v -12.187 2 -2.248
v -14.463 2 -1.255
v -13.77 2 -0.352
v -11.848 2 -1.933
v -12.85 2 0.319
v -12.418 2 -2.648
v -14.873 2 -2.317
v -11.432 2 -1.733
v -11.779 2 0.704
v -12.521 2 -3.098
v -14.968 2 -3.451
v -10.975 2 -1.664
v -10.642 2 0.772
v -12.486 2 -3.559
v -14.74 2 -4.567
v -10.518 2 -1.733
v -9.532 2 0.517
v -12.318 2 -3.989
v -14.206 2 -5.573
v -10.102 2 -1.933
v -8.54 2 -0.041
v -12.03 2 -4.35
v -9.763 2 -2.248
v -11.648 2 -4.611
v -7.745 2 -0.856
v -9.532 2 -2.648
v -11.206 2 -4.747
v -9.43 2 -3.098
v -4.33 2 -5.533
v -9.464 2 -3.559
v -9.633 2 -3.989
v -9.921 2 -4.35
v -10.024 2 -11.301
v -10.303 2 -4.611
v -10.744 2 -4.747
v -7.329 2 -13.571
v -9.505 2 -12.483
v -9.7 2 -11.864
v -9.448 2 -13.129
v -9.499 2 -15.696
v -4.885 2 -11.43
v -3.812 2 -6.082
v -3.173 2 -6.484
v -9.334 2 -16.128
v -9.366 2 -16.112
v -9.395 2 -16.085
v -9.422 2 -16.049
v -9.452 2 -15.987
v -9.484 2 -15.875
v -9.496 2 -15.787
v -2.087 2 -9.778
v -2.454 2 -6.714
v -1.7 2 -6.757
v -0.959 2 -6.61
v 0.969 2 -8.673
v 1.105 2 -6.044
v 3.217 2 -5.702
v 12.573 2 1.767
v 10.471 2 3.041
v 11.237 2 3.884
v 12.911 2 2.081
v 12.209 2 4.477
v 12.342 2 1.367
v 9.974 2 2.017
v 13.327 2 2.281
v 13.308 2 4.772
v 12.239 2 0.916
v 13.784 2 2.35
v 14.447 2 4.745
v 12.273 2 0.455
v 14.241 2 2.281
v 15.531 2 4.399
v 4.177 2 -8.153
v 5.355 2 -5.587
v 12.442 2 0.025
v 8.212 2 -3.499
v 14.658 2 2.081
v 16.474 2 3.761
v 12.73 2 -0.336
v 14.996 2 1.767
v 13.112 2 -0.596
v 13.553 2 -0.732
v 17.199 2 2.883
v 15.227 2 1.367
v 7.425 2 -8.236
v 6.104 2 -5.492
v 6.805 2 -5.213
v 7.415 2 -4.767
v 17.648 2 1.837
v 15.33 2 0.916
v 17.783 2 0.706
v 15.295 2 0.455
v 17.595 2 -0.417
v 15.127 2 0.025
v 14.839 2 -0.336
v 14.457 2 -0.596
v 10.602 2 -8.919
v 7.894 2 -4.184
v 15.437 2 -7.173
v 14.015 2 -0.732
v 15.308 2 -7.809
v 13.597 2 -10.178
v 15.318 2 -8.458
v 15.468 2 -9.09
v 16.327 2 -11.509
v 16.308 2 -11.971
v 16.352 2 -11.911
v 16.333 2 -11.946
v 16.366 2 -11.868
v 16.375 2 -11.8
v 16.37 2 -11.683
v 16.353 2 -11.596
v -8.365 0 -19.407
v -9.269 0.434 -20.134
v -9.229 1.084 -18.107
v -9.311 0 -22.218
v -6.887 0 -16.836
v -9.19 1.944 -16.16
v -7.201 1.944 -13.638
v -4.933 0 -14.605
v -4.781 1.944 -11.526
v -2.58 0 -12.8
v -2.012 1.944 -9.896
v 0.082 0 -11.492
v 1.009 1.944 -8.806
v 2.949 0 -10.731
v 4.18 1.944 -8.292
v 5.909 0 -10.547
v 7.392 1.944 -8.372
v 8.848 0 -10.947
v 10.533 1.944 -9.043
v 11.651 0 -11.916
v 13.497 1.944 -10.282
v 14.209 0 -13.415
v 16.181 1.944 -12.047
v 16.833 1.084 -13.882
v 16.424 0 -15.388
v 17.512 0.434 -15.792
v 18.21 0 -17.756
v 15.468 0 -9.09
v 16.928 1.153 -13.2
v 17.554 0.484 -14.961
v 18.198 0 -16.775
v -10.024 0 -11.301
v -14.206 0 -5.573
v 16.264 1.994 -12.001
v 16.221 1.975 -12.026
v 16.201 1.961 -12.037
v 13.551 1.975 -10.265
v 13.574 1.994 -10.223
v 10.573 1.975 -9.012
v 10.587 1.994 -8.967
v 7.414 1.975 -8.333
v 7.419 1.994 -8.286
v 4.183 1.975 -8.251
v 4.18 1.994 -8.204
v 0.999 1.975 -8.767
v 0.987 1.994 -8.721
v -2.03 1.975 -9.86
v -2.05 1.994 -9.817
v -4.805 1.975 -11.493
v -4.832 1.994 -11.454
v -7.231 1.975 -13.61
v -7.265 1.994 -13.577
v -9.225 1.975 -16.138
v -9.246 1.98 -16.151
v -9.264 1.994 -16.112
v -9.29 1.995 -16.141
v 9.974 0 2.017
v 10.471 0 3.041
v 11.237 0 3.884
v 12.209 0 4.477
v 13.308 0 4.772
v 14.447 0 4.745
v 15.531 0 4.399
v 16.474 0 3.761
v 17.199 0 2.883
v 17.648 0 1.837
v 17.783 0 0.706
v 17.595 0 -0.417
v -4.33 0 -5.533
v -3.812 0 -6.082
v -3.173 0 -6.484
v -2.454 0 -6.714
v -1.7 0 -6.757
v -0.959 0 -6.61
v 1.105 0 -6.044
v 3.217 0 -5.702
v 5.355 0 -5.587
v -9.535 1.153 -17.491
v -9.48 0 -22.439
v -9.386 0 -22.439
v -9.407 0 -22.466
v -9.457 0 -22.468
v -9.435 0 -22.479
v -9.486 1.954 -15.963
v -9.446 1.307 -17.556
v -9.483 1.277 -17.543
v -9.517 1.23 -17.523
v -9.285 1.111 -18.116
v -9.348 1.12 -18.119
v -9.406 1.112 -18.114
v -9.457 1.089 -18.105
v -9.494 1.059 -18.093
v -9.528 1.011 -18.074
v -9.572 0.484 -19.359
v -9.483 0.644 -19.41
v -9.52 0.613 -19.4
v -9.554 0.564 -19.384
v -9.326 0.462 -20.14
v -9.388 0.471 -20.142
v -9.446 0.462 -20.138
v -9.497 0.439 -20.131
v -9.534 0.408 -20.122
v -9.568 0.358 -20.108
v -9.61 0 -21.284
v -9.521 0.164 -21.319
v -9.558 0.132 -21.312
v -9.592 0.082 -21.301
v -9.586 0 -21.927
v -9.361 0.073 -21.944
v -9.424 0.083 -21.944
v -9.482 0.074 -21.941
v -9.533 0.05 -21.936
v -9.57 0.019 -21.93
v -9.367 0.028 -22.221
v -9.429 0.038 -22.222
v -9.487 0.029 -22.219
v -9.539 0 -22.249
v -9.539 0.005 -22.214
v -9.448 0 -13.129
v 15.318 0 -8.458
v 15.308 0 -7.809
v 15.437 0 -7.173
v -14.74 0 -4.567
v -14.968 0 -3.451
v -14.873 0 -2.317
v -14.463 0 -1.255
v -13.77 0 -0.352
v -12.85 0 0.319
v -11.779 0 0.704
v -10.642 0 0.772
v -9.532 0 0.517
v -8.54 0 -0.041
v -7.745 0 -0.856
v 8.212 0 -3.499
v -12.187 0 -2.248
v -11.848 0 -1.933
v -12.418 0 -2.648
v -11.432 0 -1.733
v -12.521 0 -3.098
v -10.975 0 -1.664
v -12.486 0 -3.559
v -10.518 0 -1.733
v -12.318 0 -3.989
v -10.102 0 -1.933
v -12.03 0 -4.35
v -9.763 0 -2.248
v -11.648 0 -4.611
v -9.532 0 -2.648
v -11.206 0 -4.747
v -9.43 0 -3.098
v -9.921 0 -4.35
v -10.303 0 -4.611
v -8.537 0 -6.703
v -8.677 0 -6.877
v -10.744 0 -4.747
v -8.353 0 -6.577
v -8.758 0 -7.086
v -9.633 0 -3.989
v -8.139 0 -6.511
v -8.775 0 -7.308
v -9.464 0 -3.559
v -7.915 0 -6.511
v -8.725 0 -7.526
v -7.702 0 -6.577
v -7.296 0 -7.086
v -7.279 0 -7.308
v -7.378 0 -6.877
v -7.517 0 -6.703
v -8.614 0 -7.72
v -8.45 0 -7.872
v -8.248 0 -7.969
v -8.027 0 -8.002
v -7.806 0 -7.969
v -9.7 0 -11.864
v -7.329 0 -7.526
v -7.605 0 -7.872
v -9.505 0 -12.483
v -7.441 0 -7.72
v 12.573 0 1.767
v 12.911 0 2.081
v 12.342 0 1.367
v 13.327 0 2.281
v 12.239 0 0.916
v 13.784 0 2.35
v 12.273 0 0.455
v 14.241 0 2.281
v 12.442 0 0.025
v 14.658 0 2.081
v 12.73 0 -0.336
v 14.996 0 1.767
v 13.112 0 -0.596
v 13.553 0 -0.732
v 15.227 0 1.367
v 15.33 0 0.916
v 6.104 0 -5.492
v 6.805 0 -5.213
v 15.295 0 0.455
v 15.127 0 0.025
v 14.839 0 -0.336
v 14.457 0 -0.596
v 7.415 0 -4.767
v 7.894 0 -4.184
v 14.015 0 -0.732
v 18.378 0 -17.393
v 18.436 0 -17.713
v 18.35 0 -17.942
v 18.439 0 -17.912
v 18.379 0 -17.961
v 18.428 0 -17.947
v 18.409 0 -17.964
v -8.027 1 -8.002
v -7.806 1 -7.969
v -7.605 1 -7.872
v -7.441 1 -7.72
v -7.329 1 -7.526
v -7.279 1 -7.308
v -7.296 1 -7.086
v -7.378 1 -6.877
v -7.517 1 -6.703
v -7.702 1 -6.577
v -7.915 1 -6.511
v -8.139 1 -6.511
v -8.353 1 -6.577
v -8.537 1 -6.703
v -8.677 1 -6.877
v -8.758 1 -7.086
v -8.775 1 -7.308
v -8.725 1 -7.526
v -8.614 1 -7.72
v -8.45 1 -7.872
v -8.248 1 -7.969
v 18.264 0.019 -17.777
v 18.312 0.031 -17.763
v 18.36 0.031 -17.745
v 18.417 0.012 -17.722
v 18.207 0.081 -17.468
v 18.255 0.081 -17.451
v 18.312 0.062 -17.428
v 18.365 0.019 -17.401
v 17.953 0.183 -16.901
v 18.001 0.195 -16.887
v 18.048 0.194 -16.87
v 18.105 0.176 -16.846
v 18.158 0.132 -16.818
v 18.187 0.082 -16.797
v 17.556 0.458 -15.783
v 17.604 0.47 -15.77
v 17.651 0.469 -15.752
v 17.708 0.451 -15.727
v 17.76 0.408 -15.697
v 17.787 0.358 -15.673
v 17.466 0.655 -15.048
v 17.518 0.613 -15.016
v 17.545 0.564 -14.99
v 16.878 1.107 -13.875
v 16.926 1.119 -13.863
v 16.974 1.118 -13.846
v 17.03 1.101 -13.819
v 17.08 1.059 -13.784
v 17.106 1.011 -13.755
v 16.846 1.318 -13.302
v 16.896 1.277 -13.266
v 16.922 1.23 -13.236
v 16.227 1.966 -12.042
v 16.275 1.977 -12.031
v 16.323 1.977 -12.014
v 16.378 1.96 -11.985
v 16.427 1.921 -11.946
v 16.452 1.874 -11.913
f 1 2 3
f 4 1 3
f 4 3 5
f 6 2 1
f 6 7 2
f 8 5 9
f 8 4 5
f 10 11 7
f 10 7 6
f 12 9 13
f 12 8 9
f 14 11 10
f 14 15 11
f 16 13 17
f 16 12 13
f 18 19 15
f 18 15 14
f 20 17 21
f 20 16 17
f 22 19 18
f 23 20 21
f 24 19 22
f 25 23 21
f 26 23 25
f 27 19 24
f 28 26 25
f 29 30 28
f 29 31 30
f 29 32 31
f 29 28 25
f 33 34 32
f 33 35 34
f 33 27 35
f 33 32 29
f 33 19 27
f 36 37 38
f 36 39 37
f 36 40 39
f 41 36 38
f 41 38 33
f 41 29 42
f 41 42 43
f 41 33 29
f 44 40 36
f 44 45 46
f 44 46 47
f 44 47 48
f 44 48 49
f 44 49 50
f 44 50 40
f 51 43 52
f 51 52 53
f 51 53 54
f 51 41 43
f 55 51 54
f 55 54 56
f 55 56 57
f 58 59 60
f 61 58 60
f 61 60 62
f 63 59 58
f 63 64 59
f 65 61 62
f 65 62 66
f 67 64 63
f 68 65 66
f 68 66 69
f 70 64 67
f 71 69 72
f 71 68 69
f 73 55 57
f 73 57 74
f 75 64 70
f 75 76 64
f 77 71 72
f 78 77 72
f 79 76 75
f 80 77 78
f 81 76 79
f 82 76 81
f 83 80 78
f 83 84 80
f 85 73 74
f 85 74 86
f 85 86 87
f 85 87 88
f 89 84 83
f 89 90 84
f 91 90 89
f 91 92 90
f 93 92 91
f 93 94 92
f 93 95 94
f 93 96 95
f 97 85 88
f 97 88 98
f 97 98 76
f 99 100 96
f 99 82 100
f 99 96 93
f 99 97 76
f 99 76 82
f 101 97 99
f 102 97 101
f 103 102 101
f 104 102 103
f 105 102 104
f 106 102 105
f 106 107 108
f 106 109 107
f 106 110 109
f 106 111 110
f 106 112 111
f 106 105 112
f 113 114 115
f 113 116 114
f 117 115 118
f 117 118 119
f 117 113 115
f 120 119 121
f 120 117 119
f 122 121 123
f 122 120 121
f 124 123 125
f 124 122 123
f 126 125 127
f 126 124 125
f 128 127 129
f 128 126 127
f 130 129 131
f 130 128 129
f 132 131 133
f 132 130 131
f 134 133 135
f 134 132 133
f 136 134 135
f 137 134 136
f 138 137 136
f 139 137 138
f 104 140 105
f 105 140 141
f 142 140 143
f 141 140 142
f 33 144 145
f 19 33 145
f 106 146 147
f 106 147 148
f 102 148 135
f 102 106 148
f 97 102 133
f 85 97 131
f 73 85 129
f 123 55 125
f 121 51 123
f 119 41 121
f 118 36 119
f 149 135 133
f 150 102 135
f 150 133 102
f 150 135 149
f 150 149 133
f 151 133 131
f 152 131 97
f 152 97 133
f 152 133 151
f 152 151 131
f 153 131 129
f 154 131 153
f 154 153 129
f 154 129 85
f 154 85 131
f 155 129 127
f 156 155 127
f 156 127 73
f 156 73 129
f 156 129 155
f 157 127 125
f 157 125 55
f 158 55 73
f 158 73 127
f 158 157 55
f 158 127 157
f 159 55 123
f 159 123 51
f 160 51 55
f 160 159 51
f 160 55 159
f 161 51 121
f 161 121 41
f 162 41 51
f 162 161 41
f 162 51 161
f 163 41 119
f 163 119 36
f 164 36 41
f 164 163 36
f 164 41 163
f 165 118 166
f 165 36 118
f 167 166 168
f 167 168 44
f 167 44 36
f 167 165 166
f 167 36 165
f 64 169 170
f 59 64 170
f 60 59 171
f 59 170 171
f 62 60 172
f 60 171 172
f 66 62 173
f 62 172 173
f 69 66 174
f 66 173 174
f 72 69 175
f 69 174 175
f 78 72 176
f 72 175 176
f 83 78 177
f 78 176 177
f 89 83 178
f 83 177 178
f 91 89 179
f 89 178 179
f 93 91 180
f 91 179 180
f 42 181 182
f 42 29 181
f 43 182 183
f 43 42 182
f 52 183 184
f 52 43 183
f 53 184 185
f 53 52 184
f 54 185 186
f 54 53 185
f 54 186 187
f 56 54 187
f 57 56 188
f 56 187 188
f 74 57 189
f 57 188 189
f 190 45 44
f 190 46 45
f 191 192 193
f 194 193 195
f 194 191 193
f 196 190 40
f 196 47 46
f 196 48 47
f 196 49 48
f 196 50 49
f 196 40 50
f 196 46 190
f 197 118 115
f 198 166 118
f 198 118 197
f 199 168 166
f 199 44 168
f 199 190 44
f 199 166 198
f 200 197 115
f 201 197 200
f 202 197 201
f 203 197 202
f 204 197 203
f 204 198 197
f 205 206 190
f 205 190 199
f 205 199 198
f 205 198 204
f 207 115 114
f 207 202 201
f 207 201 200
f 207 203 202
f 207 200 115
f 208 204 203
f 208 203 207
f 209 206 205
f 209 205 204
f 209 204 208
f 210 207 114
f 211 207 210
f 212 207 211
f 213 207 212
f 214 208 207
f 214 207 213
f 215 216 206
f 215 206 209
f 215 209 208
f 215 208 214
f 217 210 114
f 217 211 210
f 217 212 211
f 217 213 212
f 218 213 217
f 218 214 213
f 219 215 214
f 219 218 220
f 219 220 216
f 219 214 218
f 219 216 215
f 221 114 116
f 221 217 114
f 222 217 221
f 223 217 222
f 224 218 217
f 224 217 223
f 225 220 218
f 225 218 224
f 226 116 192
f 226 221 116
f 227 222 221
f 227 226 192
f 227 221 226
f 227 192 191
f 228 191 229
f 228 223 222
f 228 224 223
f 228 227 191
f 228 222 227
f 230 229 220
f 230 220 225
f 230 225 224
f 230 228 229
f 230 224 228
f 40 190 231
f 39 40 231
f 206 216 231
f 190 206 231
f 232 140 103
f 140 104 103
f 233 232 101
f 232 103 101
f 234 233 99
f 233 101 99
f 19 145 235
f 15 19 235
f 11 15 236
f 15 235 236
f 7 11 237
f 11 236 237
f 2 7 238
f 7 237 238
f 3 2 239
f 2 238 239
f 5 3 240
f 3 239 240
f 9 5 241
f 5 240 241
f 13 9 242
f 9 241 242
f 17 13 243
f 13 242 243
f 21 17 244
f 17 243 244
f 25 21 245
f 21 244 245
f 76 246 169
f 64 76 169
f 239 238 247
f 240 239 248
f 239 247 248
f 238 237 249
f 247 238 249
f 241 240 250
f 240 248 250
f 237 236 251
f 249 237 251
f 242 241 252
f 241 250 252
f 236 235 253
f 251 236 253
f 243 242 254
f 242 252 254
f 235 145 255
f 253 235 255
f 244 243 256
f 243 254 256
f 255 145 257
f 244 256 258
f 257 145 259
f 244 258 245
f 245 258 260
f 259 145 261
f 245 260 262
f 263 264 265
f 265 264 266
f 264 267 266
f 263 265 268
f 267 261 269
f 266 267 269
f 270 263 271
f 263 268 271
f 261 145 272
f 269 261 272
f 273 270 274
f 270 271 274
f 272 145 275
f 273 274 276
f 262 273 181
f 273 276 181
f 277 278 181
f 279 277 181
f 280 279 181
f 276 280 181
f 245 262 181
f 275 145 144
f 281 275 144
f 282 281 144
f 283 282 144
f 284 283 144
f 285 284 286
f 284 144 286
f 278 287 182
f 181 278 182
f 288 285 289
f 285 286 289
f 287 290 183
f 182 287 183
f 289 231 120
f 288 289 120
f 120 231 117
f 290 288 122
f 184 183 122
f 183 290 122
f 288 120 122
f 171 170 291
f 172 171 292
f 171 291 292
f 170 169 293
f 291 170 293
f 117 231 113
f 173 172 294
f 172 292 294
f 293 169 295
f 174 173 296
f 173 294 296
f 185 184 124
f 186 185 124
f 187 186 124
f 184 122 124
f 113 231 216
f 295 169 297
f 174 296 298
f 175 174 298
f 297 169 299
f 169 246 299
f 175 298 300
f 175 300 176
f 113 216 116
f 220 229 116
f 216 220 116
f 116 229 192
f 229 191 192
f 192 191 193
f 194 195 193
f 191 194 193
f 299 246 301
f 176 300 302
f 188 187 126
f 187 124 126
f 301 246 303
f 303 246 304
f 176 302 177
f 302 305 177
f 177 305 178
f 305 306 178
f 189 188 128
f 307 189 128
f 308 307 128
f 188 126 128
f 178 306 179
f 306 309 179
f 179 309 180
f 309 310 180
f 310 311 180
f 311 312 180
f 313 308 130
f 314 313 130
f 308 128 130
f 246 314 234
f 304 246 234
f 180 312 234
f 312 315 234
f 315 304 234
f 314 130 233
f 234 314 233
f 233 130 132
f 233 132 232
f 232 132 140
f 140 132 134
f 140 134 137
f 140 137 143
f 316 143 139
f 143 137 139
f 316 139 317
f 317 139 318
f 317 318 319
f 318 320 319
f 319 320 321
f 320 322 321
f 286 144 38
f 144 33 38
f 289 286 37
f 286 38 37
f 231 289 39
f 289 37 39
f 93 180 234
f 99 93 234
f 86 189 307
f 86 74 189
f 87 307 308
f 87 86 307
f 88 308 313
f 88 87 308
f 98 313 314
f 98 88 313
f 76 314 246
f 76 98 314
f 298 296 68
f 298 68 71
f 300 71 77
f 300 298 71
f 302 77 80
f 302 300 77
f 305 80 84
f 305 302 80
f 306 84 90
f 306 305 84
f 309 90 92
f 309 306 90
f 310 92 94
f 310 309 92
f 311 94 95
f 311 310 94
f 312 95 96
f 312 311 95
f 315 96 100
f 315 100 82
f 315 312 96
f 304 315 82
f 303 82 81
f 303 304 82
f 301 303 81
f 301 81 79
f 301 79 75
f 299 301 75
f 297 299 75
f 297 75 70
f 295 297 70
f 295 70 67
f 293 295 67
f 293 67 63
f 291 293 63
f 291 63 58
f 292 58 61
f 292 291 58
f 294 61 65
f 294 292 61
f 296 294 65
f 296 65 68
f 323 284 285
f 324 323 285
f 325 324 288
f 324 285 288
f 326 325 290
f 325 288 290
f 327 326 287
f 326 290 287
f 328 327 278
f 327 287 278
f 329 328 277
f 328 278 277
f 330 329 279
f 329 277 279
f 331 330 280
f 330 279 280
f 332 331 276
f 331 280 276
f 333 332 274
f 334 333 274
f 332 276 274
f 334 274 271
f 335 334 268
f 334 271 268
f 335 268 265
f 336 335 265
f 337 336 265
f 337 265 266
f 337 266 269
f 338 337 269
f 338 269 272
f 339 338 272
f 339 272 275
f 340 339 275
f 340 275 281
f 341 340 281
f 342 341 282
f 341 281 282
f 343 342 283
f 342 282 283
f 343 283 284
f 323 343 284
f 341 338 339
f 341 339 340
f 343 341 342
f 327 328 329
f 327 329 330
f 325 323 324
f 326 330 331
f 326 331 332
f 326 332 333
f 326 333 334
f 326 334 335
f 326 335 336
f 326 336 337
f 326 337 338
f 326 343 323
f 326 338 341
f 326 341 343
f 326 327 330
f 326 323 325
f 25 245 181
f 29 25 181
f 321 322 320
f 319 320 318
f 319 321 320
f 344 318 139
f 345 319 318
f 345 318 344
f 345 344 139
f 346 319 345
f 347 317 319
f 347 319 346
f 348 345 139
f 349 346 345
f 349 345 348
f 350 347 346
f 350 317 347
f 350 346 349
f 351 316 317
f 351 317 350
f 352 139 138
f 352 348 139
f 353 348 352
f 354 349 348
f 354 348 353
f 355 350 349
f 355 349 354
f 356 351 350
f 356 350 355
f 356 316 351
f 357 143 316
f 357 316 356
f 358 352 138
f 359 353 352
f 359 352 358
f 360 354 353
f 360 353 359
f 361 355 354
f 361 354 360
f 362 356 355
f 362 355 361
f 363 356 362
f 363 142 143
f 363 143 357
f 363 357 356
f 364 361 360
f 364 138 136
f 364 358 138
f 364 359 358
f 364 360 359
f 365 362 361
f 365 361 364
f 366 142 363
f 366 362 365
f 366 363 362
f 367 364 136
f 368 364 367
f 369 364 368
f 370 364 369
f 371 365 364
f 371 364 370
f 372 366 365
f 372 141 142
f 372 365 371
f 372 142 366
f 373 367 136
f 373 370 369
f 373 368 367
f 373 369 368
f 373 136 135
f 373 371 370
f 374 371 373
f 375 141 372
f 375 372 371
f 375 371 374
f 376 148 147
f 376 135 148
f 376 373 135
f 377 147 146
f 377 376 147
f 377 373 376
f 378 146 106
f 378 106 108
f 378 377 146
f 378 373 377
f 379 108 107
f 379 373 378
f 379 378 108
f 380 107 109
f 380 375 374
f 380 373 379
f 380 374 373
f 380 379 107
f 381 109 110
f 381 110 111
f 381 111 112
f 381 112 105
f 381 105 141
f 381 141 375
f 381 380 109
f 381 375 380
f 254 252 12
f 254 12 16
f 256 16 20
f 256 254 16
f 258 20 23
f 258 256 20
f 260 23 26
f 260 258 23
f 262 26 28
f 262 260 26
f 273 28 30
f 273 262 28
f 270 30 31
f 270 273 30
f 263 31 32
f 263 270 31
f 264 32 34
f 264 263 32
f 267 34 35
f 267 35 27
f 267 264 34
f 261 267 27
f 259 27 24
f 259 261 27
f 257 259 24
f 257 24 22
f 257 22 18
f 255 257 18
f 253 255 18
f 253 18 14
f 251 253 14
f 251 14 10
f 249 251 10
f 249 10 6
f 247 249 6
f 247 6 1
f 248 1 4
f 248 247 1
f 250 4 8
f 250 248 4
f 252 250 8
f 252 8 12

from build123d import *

# Parameters (mm, degrees)
SKETCH_1_R          = 1.55
EXTRUDE_1_DEPTH     = 2
FILLET_1_R          = 3
FILLET_2_R          = 0.2
SKETCH_3_R          = 0.75
CUT_EXTRUDE_1_DEPTH = 1


with BuildPart() as part:
    # 草图1 → 凸台-拉伸1 (new body)
    with BuildSketch(Plane(origin=(0, 0, 0), x_dir=(1, 0, 0), z_dir=(0, 1, 0))):
        with BuildLine():
            Line((-9.427629845, 12.118007633), (-14.205972572, 5.57250637))
            ThreePointArc((-14.205972572, 5.57250637), (-13.333741258, -0.01669863), (-7.744536258, 0.855532684))
            Line((-7.744536258, 0.855532684), (-2.966193531, 7.401033946))
            ThreePointArc((-2.966193531, 7.401033946), (2.156455687, 5.844533995), (7.508476858, 5.702771934))
            Line((7.508476858, 5.702771934), (9.973957748, -2.017173013))
            ThreePointArc((9.973957748, -2.017173013), (15.001264118, -4.610663069), (17.594754173, 0.416643301))
            Line((17.594754173, 0.416643301), (15.129273283, 8.136588247))
            Line((15.129273283, 8.136588247), (19.53886034, 20.548398832))
            ThreePointArc((19.53886034, 20.548398832), (2.94865648, 10.730730666), (-9.689752685, 25.287244194))
            Line((-9.689752685, 25.287244194), (-9.427629845, 12.118007633))
        make_face()
        with Locations(Location((13.784355961, -0.800264856, 0), (0, 0, 270))):
            Circle(SKETCH_1_R, mode=Mode.SUBTRACT)
        with Locations(Location((-10.975254415, 3.214019527, 0), (0, 0, 270))):
            Circle(SKETCH_1_R, mode=Mode.SUBTRACT)
    extrude(amount=EXTRUDE_1_DEPTH)

    # 圆角1
    fillet_1_edges = [part.edges().sort_by_distance(p)[0] for p in [
        (-9.427629845, 1, -12.118007633),
        (15.129273283, 1, -8.136588247),
        (7.508476858, 1, -5.702771934),
        (-2.966193531, 1, -7.401033946),
    ]]
    fillet(fillet_1_edges, radius=FILLET_1_R)

    # 草图2 → 切除-旋转1 (revolve, cut)
    with BuildSketch(Plane(origin=(5.357266973, 0, 0), x_dir=(0, -1, 0), z_dir=(-1, 0, 0))):
        with BuildLine():
            Line((5.030031962, -25.586742765), (-45.030031962, -25.586742765))
            ThreePointArc((-45.030031962, -25.586742765), (-20, -0.556710804), (5.030031962, -25.586742765))
        make_face()
    revolve(axis=Axis((5.357266973, -5.030031962, -25.586742765), (0, 1, 0)), mode=Mode.SUBTRACT)

    # 圆角2
    # the kernel refuses this fillet: 0.2 mm, written as the material it takes off along each edge
    with BuildSketch(Plane(origin=(19.53886034, 20, -20.548398832), x_dir=(0.01660114178813642, -0.9987697013737693, -0.04672778305335893), z_dir=(0.33436181166525863, 0.049589148185380114, -0.9411392539269492))) as fillet_2_piece_1:
        with BuildLine():
            CenterArc((20.396862817, 0.2), FILLET_2_R, 143.943391902, 126.056608098)
            ThreePointArc((20.235175643, 0.317716854), (20.118215024, 0.158394169), (20, 0))
            Line((20, 0), (20.396862817, 0))
        make_face()
    revolve(axis=Axis((19.53886034, 20, -20.548398832), (-0.9422985625539585, 0, -0.3347736832678813)), revolution_arc=31.526762102, mode=Mode.SUBTRACT)
    with BuildSketch(Plane(origin=(-9.689752685, 20, -25.287244194), x_dir=(0.009551792559497672, -0.8772773226727593, 0.4798888021021284), z_dir=(0.017458026871632594, 0.4799838529826972, 0.87710359603278))) as fillet_2_piece_2:
        with BuildLine():
            CenterArc((20.396862817, 0.2), FILLET_2_R, 143.943391902, 126.056608098)
            ThreePointArc((20.235175643, 0.317716854), (20.118215024, 0.158394169), (20, 0))
            Line((20, 0), (20.396862817, 0))
        make_face()
    revolve(axis=Axis((-9.689752685, 20, -25.287244194), (0.9998019706705172, 0, -0.019900237268694068)), revolution_arc=31.526762102, mode=Mode.SUBTRACT)
    with BuildSketch(Plane(origin=(5.357266973, 2, -25.586742765), x_dir=(0.6563745928876489, 0, 0.7544351488442022), z_dir=(0.7544351488442022, 0, -0.6563745928876489))) as fillet_2_piece_3:
        with BuildLine():
            CenterArc((17.473251351, 0.2), FILLET_2_R, 226.167089334, 43.832910666)
            Line((17.473251351, 0), (17.392599001, 0))
            ThreePointArc((17.392599001, 0), (17.363691769, 0.027886958), (17.334739824, 0.055727492))
        make_face()
    revolve(axis=Axis((5.357266973, 2, -25.586742765), (0, -1, 0)), revolution_arc=100.466423908, mode=Mode.SUBTRACT)

    # 草图3 → 切除-拉伸1 (cut)
    with BuildSketch(Plane.XZ):
        with Locations(Location((-8.027145861, -7.252417223, 0), (0, 0, 270))):
            Circle(SKETCH_3_R)
    extrude(amount=-CUT_EXTRUDE_1_DEPTH, mode=Mode.SUBTRACT)


solid = part.part
